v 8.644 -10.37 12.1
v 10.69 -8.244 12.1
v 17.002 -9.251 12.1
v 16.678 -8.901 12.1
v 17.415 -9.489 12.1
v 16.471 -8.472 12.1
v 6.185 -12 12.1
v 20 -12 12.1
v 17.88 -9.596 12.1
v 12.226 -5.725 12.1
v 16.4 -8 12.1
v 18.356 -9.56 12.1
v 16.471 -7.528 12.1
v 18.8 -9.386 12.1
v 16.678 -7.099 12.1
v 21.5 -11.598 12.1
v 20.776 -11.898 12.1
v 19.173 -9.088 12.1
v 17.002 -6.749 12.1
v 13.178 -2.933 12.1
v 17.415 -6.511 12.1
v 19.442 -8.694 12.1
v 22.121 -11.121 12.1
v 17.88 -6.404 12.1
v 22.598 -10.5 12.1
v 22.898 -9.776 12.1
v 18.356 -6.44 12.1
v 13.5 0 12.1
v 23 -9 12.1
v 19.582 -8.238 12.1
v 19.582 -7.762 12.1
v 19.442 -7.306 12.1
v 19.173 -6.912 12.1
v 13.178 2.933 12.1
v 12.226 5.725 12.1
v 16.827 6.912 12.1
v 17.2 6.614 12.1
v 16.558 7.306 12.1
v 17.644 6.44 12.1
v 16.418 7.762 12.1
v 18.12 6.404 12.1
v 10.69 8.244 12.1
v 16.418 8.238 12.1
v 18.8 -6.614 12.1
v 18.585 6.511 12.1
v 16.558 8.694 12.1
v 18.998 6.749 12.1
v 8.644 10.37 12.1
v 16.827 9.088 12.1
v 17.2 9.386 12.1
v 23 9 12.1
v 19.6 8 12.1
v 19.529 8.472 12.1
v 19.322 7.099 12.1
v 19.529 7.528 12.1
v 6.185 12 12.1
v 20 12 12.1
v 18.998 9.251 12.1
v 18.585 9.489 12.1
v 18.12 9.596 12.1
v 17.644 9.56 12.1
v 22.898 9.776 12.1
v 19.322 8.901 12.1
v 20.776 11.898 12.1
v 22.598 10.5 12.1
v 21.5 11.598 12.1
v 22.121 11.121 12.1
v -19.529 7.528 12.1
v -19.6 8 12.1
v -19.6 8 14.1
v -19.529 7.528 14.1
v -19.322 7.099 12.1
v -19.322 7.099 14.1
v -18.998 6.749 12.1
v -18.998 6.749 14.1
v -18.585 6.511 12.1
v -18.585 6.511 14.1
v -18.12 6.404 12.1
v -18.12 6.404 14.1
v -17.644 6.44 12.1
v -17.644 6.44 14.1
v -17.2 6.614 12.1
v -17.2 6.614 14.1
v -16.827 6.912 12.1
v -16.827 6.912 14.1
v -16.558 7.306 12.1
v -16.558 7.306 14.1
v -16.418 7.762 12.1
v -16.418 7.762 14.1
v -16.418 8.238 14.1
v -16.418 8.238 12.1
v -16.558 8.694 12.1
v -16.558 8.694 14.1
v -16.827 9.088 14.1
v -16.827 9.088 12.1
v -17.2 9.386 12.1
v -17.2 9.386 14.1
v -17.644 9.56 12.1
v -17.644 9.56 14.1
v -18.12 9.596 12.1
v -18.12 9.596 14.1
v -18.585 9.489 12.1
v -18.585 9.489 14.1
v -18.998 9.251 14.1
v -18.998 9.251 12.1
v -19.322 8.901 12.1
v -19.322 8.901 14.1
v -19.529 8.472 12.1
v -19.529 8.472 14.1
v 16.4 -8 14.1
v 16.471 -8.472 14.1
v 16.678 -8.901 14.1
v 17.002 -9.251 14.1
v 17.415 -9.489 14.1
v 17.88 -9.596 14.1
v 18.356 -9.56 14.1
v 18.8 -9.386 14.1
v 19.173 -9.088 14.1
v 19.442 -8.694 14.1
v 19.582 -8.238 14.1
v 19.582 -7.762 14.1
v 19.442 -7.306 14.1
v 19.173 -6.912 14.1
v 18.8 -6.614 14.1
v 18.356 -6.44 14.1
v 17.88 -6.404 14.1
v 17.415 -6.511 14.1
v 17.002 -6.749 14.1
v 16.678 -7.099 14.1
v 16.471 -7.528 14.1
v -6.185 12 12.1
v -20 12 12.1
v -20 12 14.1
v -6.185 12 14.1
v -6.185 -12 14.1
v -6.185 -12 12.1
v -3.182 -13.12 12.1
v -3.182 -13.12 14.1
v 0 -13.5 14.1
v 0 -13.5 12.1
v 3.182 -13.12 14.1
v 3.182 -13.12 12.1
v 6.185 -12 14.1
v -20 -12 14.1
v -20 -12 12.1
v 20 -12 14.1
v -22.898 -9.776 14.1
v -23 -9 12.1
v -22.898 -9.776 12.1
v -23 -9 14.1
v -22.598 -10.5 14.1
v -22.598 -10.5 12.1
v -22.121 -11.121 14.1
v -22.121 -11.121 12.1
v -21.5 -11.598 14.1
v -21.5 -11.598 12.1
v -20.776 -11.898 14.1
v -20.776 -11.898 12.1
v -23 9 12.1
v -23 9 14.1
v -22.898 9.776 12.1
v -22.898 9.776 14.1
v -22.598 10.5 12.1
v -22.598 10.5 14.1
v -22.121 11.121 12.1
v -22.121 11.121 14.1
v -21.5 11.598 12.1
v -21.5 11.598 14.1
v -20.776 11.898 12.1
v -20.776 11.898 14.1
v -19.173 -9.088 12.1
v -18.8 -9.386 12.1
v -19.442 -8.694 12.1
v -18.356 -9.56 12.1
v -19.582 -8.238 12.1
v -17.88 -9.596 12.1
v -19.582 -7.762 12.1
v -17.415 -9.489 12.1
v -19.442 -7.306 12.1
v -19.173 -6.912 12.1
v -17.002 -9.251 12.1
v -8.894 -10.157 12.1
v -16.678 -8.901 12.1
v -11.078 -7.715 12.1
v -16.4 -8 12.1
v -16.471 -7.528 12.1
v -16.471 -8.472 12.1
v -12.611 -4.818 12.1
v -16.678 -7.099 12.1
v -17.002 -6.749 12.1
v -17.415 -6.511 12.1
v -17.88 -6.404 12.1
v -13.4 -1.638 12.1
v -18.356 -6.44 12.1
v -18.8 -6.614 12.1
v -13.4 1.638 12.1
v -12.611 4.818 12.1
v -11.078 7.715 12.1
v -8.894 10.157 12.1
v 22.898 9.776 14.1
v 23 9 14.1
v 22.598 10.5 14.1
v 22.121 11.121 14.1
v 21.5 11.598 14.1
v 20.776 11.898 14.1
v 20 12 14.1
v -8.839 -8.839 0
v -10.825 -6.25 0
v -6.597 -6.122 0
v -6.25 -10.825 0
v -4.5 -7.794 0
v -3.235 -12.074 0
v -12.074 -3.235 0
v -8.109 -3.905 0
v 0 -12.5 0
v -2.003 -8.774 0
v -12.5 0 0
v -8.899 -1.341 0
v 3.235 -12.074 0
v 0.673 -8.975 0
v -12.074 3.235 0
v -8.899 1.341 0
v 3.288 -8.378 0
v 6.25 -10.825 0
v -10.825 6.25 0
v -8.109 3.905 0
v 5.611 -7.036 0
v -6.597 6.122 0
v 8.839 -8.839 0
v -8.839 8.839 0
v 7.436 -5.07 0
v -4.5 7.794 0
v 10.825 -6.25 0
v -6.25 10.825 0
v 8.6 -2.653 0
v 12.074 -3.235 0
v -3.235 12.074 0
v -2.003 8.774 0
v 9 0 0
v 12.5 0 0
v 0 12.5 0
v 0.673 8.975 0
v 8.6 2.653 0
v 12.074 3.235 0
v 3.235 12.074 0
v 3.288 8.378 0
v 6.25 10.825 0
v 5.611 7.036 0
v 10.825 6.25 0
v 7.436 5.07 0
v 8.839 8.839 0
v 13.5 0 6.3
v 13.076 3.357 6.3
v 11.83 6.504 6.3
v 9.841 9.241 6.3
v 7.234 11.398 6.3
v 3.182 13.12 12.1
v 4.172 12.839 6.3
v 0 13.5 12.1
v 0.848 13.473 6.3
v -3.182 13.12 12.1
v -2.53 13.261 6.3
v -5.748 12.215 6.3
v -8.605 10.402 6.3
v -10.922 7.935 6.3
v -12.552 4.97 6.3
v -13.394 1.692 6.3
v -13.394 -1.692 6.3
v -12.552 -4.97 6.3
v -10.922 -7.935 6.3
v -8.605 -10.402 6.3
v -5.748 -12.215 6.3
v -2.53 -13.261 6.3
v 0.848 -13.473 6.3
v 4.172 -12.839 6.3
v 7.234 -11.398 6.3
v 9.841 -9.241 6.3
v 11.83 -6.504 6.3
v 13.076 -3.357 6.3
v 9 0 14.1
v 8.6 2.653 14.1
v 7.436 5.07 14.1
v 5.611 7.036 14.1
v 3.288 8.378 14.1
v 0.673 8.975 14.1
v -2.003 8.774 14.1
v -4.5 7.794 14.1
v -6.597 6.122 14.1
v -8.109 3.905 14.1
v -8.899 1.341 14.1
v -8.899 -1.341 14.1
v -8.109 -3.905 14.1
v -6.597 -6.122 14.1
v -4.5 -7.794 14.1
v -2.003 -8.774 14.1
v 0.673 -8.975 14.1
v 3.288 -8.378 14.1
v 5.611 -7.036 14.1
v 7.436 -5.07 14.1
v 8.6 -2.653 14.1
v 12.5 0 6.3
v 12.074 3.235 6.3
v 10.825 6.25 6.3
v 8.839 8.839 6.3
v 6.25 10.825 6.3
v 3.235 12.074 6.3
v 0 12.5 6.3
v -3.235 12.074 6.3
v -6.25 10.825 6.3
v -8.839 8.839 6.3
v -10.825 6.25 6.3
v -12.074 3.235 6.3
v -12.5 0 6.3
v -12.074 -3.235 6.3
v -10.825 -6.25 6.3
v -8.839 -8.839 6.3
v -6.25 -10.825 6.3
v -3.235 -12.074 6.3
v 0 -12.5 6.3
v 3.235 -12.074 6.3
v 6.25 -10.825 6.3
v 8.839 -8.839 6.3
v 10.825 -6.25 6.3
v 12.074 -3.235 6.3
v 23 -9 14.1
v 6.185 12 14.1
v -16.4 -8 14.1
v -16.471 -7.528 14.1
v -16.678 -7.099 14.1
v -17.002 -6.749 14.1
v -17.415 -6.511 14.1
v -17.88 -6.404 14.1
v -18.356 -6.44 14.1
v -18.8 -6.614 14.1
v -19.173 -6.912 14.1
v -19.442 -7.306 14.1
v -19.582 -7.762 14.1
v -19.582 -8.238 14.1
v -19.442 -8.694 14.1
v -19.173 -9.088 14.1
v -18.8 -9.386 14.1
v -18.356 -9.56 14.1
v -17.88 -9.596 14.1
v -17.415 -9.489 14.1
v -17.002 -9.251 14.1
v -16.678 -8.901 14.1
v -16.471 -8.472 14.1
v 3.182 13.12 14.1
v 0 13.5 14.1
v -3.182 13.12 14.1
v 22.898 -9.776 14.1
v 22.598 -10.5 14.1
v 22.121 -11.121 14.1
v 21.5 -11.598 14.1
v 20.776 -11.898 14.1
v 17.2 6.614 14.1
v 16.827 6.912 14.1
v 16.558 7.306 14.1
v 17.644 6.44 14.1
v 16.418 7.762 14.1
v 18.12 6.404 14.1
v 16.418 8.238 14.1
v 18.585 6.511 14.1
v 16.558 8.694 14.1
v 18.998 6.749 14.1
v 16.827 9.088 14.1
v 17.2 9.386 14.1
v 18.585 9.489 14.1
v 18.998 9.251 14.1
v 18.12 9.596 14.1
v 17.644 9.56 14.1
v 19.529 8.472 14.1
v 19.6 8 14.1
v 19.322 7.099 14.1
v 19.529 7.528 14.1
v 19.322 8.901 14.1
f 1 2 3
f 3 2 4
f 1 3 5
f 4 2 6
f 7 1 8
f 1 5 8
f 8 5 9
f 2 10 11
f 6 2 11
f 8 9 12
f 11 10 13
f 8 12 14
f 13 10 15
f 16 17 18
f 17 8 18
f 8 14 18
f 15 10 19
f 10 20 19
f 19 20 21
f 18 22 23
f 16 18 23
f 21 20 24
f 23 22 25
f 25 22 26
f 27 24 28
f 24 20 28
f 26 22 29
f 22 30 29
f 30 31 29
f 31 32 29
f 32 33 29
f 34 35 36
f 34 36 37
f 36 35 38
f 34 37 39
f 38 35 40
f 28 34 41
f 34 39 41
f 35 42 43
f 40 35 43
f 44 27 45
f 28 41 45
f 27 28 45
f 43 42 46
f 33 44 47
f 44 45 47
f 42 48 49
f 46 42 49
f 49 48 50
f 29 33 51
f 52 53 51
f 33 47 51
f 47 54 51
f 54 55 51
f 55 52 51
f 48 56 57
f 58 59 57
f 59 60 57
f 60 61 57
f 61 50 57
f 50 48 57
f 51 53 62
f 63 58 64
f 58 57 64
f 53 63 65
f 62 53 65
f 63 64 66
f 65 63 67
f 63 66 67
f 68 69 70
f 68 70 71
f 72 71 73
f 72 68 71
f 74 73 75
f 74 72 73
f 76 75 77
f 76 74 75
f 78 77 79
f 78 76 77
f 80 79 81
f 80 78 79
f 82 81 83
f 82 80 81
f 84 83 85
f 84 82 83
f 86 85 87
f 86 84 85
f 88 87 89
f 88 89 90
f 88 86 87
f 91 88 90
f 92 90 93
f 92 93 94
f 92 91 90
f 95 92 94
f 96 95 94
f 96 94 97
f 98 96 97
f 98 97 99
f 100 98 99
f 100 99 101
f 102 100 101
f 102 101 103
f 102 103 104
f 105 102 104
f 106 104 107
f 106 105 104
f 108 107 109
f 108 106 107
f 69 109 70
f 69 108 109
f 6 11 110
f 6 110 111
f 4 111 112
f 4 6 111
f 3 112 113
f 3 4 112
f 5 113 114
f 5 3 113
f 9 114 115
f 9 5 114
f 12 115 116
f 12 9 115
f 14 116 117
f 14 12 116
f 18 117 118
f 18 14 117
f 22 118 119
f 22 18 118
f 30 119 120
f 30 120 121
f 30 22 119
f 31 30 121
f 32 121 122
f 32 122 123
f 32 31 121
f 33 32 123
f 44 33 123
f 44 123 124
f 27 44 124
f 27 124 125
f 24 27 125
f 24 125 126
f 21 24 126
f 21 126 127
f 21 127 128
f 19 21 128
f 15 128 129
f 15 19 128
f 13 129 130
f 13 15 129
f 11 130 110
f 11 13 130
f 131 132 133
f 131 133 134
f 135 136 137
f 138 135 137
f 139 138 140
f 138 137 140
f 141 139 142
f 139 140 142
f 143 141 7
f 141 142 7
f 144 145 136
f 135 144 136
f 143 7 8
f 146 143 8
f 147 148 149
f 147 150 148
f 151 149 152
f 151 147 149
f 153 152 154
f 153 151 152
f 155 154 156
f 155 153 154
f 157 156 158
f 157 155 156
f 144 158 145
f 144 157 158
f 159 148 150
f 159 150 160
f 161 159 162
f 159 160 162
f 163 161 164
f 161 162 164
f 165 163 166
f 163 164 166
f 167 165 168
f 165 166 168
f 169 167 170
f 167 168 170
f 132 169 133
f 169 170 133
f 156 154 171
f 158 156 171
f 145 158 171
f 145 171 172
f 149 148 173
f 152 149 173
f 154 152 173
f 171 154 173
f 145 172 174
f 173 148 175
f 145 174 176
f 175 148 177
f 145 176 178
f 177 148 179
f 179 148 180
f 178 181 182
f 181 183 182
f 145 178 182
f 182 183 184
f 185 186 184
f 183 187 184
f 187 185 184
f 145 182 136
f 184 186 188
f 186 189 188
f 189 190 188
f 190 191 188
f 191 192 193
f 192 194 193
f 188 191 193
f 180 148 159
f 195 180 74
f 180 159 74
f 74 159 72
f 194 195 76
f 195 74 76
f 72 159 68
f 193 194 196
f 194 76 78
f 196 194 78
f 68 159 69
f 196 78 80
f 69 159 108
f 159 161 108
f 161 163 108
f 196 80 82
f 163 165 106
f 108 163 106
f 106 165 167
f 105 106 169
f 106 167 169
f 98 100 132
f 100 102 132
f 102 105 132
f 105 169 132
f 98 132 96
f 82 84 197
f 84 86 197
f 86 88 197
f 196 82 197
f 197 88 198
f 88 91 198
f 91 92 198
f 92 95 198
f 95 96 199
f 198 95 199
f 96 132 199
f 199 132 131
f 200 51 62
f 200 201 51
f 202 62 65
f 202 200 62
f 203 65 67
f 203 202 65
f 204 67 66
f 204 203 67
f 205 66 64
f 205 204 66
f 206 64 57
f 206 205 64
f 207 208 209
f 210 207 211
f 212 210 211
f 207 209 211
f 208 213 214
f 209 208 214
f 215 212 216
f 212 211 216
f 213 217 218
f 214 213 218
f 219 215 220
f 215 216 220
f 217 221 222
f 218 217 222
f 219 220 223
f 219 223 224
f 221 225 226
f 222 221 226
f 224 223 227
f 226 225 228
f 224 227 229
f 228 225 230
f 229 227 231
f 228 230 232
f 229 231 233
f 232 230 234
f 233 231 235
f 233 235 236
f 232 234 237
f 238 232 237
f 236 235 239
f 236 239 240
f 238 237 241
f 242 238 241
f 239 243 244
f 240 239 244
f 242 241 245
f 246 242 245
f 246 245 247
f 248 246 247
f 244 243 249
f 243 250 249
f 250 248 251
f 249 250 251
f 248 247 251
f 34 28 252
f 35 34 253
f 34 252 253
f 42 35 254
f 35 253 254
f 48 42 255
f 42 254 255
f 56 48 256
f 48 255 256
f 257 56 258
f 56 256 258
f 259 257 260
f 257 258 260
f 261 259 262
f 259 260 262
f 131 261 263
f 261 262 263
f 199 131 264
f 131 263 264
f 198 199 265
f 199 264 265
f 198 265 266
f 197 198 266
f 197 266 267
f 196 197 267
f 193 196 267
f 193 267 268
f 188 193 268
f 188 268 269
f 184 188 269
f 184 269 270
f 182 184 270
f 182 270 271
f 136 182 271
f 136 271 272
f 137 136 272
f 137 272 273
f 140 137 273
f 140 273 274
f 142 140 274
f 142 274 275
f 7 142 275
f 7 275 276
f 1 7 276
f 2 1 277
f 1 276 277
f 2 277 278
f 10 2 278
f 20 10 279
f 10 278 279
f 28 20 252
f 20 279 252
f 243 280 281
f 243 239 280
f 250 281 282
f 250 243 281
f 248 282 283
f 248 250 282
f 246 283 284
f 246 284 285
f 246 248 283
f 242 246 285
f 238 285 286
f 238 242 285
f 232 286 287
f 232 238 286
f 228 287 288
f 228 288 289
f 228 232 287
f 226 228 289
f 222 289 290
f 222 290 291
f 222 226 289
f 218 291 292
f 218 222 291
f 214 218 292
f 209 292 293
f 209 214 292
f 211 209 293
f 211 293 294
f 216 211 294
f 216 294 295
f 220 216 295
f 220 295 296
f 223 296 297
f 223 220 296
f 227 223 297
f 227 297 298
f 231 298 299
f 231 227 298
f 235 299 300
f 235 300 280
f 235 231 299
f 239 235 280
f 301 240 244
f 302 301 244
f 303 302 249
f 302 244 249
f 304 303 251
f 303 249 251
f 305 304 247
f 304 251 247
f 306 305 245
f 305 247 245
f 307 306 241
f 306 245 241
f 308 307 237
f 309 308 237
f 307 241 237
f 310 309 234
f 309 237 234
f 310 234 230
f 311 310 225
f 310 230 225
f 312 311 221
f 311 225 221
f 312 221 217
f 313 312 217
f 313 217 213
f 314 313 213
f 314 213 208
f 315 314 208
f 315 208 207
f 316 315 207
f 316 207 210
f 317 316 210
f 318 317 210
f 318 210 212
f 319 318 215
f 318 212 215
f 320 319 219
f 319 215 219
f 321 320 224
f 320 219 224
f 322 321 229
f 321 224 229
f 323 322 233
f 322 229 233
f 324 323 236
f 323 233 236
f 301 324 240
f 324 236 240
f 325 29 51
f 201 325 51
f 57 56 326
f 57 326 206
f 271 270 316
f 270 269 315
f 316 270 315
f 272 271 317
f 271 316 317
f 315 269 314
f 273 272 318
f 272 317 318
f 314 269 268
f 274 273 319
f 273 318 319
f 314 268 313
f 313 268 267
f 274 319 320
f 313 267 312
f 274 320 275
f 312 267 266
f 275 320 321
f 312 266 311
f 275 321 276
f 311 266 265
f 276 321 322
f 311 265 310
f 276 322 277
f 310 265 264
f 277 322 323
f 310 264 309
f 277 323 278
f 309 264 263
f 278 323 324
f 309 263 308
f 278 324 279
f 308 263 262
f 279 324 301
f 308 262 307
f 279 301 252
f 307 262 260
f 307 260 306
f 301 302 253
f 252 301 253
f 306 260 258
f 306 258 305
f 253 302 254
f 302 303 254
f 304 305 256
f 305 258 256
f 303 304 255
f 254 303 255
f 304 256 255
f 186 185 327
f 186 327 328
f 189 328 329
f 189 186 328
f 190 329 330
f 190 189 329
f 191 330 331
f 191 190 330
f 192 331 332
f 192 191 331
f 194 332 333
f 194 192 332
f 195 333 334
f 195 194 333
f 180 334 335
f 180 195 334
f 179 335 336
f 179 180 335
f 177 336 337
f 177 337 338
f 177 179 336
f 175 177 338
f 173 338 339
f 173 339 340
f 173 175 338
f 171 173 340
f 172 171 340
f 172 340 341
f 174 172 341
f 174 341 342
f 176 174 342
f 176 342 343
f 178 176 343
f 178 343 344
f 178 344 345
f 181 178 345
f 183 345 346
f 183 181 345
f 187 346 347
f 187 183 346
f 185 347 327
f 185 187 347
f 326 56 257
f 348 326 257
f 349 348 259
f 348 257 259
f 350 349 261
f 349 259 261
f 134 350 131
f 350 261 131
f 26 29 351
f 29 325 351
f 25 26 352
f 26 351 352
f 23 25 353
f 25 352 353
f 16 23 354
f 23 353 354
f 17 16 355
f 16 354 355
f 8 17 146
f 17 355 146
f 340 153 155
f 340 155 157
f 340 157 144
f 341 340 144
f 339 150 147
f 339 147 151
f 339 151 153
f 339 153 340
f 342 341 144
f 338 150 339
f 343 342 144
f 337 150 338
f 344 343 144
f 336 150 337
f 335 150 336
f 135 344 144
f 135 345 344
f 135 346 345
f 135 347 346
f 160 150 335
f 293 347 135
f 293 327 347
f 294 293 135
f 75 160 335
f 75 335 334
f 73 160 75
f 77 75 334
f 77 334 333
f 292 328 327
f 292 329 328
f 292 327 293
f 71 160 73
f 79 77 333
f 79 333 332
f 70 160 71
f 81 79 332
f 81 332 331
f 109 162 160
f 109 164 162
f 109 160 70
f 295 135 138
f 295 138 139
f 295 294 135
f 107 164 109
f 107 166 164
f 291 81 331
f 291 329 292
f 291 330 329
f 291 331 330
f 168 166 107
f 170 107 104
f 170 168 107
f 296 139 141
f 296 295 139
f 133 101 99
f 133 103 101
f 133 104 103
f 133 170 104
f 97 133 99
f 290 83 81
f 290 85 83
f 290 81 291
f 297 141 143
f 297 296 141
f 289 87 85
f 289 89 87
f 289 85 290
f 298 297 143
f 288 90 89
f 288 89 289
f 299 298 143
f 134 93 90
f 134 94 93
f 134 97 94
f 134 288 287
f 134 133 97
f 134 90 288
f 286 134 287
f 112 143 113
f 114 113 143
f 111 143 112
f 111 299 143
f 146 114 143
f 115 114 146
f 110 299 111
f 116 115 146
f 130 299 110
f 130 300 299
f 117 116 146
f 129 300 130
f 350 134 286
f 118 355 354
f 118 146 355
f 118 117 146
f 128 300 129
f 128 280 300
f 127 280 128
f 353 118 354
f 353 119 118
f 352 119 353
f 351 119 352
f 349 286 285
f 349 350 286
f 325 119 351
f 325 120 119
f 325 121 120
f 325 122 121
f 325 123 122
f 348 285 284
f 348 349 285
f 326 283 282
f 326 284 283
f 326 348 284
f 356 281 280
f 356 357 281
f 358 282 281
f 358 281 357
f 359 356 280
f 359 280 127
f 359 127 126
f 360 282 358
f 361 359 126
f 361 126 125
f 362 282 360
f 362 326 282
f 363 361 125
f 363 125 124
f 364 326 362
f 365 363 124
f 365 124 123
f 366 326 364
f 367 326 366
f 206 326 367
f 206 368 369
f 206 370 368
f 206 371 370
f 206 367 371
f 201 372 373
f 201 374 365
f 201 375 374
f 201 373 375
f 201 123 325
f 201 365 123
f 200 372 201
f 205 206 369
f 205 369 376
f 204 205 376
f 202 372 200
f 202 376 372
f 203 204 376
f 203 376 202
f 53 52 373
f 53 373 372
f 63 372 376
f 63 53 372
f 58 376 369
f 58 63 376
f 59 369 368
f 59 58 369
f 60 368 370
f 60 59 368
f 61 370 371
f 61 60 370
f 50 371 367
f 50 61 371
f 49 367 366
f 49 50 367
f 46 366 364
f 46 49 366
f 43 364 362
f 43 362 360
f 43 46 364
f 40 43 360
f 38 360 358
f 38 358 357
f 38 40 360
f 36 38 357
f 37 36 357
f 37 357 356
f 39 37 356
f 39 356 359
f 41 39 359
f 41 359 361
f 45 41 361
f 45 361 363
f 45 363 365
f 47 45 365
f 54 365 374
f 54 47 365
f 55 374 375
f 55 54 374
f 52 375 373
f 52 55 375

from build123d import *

# Parameters (mm, degrees)
SKETCH_1_R      = 12.5
SKETCH_1_R_2    = 9
EXTRUDE_1_DEPTH = 6.3
SKETCH_2_R      = 13.5
SKETCH_2_R_2    = 9
EXTRUDE_2_DEPTH = 5.8
SKETCH_3_W      = 46
SKETCH_3_H      = 24
SKETCH_3_R      = 9
SKETCH_3_R_2    = 1.6
EXTRUDE_3_DEPTH = 2
FILLET_1_R      = 3
EXTRUDE_4_DEPTH = 2


with BuildPart() as part:
    # 草图1 → 凸台-拉伸1 (new body)
    with BuildSketch(Plane.XY):
        Circle(SKETCH_1_R)
        Circle(SKETCH_1_R_2, mode=Mode.SUBTRACT)
    extrude(amount=EXTRUDE_1_DEPTH)

    # 草图2 → 凸台-拉伸2 (add)
    with BuildSketch(Plane.XY.offset(6.3)):
        Circle(SKETCH_2_R)
        Circle(SKETCH_2_R_2, mode=Mode.SUBTRACT)
    extrude(amount=EXTRUDE_2_DEPTH)

    # 草图3 → 凸台-拉伸3 (add)
    with BuildSketch(Plane.XY.offset(12.1)):
        Rectangle(SKETCH_3_W, SKETCH_3_H)
        Circle(SKETCH_3_R, mode=Mode.SUBTRACT)
        with Locations((18, 8)):
            Circle(SKETCH_3_R_2, mode=Mode.SUBTRACT)
        with Locations(Location((18, -8, 0), (0, 0, 180))):
            Circle(SKETCH_3_R_2, mode=Mode.SUBTRACT)
        with Locations((-18, -8)):
            Circle(SKETCH_3_R_2, mode=Mode.SUBTRACT)
        with Locations(Location((-18, 8, 0), (0, 0, 180))):
            Circle(SKETCH_3_R_2, mode=Mode.SUBTRACT)
    extrude(amount=EXTRUDE_3_DEPTH)

    # 圆角1
    fillet_1_edges = [part.edges().sort_by_distance(p)[0] for p in [
        (23, 12, 13.1),
        (-23, 12, 13.1),
        (-23, -12, 13.1),
        (23, -12, 13.1),
    ]]
    fillet(fillet_1_edges, radius=FILLET_1_R)

    # 草图4 → 凸台-拉伸4 (add)
    with BuildSketch(Plane.XY.offset(12.1)):
        with BuildLine():
            Line((6.184658438, -12), (-6.184658438, -12))
            ThreePointArc((-6.184658438, -12), (0, -13.5), (6.184658438, -12))
        make_face()
        with BuildLine():
            Line((-6.184658438, 12), (6.184658438, 12))
            ThreePointArc((6.184658438, 12), (0, 13.5), (-6.184658438, 12))
        make_face()
    extrude(amount=EXTRUDE_4_DEPTH)


solid = part.part
